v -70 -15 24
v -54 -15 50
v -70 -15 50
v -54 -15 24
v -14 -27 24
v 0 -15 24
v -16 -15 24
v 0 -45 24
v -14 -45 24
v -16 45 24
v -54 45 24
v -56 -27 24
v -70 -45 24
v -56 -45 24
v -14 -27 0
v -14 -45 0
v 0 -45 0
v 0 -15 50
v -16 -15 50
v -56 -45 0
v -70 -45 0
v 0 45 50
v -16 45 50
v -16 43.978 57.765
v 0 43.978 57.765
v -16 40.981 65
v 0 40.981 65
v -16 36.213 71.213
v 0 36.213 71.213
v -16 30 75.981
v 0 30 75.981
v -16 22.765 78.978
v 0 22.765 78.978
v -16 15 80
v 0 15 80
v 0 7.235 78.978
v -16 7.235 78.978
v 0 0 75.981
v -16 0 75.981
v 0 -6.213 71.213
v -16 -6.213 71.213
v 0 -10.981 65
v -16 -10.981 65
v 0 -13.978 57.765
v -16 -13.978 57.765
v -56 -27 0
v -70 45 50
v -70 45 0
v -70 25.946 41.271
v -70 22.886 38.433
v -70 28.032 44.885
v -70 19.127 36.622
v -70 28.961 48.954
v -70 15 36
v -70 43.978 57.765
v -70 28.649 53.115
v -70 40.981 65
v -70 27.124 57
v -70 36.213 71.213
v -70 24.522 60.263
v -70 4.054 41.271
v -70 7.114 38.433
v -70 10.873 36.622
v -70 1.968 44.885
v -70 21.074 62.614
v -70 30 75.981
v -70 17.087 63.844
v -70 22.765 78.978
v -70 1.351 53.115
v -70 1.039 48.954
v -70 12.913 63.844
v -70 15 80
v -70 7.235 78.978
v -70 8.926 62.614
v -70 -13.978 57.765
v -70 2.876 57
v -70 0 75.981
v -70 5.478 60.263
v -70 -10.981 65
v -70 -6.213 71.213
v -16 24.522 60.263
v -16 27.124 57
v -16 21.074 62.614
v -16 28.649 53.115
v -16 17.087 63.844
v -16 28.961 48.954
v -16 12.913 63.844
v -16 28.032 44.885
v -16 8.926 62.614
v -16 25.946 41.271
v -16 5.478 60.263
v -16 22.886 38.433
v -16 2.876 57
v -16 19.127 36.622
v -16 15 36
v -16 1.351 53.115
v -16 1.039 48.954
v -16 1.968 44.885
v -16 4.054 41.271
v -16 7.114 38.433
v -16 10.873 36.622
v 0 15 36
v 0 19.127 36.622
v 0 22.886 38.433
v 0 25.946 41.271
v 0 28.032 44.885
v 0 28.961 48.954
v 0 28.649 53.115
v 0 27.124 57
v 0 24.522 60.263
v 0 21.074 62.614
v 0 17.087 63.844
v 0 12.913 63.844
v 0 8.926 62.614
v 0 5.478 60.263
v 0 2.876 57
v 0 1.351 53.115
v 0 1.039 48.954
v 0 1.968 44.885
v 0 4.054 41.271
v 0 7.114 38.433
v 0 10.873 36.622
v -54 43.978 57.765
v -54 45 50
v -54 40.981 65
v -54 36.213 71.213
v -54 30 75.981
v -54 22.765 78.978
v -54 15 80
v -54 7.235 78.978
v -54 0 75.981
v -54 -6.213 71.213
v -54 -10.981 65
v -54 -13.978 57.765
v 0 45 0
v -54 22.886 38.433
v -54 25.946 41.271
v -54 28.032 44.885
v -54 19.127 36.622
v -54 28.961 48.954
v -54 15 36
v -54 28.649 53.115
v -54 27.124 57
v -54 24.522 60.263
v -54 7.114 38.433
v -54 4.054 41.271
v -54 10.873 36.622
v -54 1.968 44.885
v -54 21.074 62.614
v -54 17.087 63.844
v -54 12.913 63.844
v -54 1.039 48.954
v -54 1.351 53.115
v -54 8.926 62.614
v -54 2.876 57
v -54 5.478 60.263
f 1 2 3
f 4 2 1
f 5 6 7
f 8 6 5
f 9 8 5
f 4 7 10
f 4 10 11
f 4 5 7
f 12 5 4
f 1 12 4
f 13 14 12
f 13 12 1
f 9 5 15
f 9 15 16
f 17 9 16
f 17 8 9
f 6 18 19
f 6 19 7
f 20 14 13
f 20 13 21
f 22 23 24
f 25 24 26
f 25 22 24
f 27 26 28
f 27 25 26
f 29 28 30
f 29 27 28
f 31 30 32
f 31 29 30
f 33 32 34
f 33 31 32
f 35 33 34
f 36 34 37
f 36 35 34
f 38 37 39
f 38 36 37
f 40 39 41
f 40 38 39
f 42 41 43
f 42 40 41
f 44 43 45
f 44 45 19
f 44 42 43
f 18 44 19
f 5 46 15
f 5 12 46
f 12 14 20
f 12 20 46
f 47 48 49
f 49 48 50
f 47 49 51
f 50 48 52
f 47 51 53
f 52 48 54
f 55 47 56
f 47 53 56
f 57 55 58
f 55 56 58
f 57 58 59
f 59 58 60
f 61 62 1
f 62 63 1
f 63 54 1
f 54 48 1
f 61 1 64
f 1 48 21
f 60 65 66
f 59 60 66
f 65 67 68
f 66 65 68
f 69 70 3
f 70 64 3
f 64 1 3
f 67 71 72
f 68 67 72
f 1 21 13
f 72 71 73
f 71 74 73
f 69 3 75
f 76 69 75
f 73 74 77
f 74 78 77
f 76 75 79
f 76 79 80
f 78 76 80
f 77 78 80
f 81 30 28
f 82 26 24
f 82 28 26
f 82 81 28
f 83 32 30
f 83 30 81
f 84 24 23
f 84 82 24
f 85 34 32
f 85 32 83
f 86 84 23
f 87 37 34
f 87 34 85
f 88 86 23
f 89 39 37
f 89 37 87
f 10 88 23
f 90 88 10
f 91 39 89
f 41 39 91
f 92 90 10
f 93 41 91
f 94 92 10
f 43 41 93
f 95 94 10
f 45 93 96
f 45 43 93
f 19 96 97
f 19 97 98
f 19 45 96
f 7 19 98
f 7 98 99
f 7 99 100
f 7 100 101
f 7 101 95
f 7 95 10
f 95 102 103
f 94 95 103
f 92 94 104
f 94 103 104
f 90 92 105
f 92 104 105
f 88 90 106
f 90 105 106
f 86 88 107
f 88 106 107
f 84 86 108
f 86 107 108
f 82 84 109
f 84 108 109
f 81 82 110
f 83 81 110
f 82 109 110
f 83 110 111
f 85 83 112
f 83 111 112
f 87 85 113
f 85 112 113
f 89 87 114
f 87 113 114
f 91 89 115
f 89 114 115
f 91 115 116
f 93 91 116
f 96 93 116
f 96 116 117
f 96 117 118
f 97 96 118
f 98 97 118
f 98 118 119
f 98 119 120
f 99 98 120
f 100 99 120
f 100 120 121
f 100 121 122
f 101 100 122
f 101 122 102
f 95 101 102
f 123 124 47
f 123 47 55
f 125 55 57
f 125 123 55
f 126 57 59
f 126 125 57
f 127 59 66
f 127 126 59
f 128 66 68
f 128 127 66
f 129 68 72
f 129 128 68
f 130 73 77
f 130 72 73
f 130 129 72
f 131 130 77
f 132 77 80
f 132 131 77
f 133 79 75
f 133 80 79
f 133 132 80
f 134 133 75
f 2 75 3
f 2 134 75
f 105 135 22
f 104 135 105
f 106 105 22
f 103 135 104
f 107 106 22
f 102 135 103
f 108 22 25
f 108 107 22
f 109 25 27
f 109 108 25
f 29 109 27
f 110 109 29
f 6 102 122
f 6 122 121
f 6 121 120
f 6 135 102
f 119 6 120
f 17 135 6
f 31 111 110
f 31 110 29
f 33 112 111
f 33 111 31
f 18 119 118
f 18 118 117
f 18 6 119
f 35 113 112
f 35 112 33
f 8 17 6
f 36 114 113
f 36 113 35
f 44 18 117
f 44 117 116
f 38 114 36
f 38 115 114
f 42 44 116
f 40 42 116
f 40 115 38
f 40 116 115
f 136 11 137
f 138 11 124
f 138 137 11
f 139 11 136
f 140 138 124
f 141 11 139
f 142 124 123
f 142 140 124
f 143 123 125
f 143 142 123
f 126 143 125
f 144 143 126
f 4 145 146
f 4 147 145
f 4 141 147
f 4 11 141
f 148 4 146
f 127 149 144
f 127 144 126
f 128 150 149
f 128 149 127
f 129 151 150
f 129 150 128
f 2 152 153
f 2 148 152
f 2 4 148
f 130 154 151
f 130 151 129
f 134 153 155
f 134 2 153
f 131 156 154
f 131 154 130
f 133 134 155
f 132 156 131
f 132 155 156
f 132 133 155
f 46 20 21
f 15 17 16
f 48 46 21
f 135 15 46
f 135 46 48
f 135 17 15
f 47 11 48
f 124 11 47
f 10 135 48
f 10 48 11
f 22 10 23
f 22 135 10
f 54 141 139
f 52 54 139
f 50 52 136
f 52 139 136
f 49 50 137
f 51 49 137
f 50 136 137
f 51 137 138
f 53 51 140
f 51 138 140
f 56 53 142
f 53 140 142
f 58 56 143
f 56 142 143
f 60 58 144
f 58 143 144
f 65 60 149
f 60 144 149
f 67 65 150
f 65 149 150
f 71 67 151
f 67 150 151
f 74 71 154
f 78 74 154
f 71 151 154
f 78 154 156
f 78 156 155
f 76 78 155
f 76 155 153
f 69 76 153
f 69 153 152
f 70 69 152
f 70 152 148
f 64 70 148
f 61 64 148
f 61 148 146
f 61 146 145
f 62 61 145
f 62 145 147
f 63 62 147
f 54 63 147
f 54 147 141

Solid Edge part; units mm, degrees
sketch "Sketch1" plane through (0, 0, 0) normal (1, 0, 0) x (0, 1, 0)
  line L0 (45, 0) -> (45, 50)
  line L1 (-45, 0) -> (45, 0)
  line L2 (-45, 24) -> (-45, 0)
  line L3 (-15, 24) -> (-45, 24)
  line L4 (-15, 50) -> (-15, 24)
  arc A0 (-15, 50) -> (45, 50) centre (15, 50) cw
extrude "ProtrusiónExtruida_1" add sketch "Sketch1" against normal blind 70
sketch "Sketch2" plane through (-35, -15, 37) normal (0, -1, 0) x (1, 0, 0)
  line L0 (-19, -13) -> (-19, 43)
  line L1 (-19, 43) -> (19, 43)
  line L2 (19, 43) -> (19, -13)
  line L3 (19, -13) -> (-19, -13)
extrude "VaciadoExtruido_1" cut sketch "Sketch2" against normal blind 60
hole "Agujero_1" at (0, 15, 50) direction (-1, 0, 0) diameter 28 end through all
sketch "Sketch3" plane through (-35, 0, 24) normal (0, 0, 1) x (0, 1, 0)
  line L0 (-45, 21) -> (-27, 21)
  line L1 (-27, 21) -> (-27, -21)
  line L2 (-27, -21) -> (-45, -21)
  line L3 (-45, -21) -> (-45, 21)
extrude "VaciadoExtruido_2" cut sketch "Sketch3" against normal blind 24
